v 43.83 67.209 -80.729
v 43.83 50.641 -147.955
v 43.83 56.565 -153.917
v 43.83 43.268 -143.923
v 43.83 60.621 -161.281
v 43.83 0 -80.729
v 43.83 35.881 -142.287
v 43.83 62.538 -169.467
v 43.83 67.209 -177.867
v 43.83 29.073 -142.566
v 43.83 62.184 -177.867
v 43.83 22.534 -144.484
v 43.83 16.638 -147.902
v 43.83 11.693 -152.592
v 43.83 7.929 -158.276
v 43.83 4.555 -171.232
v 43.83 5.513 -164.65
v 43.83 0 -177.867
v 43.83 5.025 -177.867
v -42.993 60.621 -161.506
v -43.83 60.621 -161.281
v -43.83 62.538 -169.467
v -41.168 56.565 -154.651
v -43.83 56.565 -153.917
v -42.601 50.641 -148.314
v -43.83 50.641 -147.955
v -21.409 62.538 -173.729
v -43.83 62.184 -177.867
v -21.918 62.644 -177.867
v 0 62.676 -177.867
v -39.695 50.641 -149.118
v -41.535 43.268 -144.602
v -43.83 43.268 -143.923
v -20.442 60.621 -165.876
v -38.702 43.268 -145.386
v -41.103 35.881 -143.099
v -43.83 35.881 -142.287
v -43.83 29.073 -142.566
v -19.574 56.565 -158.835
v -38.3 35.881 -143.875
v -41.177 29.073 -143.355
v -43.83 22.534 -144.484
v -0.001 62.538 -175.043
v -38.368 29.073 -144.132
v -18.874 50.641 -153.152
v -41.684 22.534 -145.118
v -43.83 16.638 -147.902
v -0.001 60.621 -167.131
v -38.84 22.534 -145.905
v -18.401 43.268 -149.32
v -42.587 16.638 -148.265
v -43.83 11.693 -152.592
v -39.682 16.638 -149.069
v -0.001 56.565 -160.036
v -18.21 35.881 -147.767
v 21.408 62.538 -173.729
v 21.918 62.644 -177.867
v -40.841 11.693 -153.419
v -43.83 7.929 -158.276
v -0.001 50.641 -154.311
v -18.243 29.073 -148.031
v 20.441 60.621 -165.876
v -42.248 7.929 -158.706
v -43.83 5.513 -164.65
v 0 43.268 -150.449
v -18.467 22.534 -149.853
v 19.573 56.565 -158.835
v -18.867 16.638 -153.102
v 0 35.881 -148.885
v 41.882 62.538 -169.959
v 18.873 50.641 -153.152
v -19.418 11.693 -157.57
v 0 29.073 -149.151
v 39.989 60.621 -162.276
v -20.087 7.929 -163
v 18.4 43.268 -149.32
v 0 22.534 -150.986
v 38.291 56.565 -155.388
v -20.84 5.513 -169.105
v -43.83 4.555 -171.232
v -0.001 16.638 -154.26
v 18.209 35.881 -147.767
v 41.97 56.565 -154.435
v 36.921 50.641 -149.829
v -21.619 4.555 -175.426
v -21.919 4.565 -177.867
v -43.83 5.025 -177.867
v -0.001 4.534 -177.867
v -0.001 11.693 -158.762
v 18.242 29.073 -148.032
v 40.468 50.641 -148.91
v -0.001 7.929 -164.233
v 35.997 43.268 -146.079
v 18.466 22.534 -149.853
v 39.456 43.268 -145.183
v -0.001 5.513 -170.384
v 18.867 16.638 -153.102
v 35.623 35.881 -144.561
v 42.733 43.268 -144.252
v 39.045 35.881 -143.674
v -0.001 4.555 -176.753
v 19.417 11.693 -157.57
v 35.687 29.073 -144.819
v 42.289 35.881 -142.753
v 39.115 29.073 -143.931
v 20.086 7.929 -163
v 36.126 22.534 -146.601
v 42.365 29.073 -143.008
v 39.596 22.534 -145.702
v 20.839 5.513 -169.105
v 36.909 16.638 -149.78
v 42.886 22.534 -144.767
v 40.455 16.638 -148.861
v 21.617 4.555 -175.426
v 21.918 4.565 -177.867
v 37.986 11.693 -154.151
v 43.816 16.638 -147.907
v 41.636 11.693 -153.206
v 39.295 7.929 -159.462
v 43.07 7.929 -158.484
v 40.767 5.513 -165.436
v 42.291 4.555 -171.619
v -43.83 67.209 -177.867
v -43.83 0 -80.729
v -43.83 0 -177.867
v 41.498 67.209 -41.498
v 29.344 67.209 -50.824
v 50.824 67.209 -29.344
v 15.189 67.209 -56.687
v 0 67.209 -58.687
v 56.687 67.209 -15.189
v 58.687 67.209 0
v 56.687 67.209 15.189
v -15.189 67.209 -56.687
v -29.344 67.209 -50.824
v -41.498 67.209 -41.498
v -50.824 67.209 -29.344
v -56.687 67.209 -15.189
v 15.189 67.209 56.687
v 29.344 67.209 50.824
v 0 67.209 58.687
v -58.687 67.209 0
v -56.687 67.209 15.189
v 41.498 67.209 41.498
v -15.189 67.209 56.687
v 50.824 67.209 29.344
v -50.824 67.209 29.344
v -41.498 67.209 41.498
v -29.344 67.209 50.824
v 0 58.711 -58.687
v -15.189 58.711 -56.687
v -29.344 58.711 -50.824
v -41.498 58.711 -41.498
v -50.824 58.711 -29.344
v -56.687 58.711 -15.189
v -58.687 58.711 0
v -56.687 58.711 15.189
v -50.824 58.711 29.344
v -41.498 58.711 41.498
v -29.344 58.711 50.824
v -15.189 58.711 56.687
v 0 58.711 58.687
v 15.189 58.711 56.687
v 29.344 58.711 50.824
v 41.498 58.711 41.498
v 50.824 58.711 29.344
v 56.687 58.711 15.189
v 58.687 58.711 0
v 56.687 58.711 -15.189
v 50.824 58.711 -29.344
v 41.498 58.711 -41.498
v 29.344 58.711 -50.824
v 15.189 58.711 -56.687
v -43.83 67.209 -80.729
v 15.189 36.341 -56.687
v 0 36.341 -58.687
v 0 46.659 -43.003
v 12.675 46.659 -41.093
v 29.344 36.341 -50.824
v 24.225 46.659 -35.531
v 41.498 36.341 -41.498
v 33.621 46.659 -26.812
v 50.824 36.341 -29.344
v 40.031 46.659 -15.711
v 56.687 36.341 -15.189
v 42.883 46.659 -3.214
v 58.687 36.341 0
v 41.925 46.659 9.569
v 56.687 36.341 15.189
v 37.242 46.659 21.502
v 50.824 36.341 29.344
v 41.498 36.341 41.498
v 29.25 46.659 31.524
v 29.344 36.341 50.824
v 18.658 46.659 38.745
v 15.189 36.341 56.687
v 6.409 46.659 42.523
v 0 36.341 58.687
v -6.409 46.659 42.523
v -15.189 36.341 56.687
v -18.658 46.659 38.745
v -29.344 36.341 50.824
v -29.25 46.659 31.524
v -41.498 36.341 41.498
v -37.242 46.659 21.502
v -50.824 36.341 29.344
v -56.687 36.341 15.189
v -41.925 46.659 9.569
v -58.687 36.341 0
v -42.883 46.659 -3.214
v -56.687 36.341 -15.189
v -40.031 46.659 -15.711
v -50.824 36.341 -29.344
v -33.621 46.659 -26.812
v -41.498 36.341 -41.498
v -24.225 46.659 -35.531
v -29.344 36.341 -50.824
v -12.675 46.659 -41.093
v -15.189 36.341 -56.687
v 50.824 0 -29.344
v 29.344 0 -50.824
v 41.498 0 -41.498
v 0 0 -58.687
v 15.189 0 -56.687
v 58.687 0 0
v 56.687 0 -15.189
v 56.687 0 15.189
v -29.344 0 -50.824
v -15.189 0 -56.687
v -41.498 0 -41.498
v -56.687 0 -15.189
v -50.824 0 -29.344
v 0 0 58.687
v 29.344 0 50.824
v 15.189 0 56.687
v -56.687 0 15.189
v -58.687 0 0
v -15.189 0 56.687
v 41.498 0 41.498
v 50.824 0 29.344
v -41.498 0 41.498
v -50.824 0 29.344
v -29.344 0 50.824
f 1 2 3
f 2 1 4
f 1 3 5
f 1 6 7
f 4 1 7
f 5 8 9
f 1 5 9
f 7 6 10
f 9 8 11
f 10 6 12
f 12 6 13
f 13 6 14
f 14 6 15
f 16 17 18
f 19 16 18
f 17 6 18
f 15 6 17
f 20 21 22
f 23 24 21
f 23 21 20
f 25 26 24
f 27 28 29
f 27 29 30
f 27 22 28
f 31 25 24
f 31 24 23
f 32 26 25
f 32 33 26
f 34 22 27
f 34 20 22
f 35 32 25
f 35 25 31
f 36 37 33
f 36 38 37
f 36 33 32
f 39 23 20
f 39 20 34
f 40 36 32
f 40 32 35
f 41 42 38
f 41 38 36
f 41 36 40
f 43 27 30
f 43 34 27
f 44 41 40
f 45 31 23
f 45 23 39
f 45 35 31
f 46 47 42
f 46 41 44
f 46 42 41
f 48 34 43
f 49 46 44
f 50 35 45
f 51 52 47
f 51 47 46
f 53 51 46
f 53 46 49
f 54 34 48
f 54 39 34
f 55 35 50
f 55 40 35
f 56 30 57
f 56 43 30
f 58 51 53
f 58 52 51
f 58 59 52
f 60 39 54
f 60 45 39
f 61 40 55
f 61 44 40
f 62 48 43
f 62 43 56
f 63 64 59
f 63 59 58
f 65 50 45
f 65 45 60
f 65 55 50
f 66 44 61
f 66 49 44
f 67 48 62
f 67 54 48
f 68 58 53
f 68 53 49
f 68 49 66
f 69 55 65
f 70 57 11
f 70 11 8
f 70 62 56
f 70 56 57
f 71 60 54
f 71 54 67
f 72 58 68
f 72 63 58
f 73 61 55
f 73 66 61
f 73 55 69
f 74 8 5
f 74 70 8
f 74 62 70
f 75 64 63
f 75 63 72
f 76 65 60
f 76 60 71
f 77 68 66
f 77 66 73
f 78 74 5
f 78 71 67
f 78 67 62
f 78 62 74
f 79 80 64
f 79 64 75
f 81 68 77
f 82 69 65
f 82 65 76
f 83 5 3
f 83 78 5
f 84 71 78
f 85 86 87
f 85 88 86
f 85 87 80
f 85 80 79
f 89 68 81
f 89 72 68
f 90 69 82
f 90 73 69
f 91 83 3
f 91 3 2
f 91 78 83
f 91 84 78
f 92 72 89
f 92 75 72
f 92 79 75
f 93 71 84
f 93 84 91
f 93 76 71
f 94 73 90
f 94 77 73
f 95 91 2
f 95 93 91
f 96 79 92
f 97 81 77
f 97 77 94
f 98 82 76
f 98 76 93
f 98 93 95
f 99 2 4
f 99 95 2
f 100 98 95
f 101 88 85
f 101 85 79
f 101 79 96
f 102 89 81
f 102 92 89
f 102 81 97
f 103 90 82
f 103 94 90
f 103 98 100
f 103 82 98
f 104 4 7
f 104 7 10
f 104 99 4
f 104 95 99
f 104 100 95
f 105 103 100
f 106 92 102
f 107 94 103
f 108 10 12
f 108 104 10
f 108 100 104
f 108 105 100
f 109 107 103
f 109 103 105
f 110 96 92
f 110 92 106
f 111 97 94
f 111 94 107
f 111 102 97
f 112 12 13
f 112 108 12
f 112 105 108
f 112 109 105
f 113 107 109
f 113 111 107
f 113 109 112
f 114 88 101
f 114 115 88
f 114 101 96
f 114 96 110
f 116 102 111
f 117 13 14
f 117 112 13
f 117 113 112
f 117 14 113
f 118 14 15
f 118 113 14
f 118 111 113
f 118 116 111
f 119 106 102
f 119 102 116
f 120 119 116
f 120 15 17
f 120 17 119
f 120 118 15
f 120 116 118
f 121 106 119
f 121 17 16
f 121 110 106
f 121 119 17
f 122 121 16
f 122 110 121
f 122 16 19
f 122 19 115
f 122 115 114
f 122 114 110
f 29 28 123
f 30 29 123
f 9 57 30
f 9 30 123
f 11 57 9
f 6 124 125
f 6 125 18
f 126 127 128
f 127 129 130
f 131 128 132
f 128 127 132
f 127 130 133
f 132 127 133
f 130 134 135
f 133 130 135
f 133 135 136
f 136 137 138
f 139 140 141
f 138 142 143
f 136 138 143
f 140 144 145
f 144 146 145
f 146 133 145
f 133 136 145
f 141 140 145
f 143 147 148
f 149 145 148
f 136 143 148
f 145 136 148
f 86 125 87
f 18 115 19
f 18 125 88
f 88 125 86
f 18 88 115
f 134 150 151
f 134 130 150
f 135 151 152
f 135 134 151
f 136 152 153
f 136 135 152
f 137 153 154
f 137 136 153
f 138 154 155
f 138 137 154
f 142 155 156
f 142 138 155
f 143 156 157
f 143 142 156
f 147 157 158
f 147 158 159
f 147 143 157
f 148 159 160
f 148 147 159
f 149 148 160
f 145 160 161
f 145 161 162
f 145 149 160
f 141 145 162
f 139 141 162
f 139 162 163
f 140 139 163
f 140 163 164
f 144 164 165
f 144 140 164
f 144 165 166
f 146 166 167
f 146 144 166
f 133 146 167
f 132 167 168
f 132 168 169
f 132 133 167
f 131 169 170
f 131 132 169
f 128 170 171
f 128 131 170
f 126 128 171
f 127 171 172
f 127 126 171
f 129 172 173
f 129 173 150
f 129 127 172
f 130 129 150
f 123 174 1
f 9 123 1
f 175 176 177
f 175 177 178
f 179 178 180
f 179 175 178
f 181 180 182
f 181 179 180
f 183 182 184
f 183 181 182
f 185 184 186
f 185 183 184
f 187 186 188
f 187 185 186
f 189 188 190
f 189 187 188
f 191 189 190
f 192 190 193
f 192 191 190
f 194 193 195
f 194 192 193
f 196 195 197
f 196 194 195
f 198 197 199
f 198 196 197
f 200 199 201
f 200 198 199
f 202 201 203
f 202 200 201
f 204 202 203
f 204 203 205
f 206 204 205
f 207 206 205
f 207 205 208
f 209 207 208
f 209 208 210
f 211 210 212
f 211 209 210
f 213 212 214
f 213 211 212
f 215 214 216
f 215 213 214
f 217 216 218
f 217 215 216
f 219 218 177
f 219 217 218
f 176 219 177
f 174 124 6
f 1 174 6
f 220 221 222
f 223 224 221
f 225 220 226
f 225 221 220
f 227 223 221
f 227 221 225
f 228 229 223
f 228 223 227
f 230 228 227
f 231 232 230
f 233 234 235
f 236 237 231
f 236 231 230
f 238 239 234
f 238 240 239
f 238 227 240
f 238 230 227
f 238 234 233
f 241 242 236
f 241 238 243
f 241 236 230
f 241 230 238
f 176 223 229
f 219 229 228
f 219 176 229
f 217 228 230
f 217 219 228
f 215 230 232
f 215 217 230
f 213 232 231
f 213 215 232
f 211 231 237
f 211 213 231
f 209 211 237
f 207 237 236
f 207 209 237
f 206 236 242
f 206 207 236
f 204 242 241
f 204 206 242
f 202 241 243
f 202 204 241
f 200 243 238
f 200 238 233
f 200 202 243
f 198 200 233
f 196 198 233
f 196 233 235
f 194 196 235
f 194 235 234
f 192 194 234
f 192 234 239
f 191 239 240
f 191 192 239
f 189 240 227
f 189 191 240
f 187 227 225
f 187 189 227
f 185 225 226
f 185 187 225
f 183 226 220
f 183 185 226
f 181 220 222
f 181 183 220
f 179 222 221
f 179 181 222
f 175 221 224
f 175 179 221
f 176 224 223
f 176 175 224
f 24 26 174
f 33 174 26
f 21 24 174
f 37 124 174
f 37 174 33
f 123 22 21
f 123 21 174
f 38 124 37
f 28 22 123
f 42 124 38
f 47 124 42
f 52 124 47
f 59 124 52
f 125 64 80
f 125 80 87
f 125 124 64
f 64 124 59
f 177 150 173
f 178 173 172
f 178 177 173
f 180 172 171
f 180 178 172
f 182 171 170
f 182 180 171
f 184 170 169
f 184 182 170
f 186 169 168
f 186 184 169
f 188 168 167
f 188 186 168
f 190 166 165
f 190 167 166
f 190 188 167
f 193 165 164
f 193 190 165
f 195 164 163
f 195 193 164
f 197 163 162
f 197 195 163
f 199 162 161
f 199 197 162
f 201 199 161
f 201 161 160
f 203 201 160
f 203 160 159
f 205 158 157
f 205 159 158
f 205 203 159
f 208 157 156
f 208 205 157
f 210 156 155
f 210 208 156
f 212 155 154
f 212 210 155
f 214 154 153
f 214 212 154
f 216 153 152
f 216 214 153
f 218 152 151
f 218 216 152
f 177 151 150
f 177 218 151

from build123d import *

# Parameters (mm, degrees)
SKETCH1_W           = 58.68704402
SKETCH1_H           = 67.209255033
SKETCH2_W           = 87.660679444
SKETCH2_H           = 97.137509655
BOSS_EXTRUDE1_DEPTH = 67.209255033
SKETCH3_R           = 29.07089472


with BuildPart() as part:
    # Sketch1 → Revolve1 (revolve)
    with BuildSketch(Plane.XY, mode=Mode.PRIVATE) as revolve1_sk:
        with Locations((29.34352201, 33.604627517)):
            Rectangle(SKETCH1_W, SKETCH1_H)
    revolve(revolve1_sk.sketch.rotate(Axis((0, 0, 0), (0, 1, 0)), 90), axis=Axis((0, 0, 0), (0, 1, 0)))


with BuildPart() as body_2:
    # Sketch2 → Boss-Extrude1 (new body)
    with BuildSketch(Plane(origin=(0, 0, 0), x_dir=(1, 0, 0), z_dir=(0, 1, 0))):
        with Locations((0, 129.298002943)):
            Rectangle(SKETCH2_W, SKETCH2_H)
    extrude(amount=BOSS_EXTRUDE1_DEPTH)


with BuildPart() as cut_revolve1_tool:
    # Sketch3 → Cut-Revolve1 (revolve)
    with BuildSketch(Plane(origin=(0, 0, 0), x_dir=(0, 0, -1), z_dir=(1, 0, 0))):
        with Locations((177.86675777, 33.604627516)):
            Circle(SKETCH3_R)
        Polygon((62.846148494, 61.906953495), (43.003189321, 46.65920592), (62.846148494, 33.604627516), align=None)
    revolve(axis=Axis((0, 0, 0), (0, -1, 0)))


with BuildPart() as part_1:
    add(part.part)

    # Cut-Revolve1: cut by cut_revolve1_tool
    add(cut_revolve1_tool.part, mode=Mode.SUBTRACT)


with BuildPart() as body_2_1:
    add(body_2.part)

    # Cut-Revolve1: cut by cut_revolve1_tool
    add(cut_revolve1_tool.part, mode=Mode.SUBTRACT)


solid = Compound([part_1.part, body_2_1.part])
